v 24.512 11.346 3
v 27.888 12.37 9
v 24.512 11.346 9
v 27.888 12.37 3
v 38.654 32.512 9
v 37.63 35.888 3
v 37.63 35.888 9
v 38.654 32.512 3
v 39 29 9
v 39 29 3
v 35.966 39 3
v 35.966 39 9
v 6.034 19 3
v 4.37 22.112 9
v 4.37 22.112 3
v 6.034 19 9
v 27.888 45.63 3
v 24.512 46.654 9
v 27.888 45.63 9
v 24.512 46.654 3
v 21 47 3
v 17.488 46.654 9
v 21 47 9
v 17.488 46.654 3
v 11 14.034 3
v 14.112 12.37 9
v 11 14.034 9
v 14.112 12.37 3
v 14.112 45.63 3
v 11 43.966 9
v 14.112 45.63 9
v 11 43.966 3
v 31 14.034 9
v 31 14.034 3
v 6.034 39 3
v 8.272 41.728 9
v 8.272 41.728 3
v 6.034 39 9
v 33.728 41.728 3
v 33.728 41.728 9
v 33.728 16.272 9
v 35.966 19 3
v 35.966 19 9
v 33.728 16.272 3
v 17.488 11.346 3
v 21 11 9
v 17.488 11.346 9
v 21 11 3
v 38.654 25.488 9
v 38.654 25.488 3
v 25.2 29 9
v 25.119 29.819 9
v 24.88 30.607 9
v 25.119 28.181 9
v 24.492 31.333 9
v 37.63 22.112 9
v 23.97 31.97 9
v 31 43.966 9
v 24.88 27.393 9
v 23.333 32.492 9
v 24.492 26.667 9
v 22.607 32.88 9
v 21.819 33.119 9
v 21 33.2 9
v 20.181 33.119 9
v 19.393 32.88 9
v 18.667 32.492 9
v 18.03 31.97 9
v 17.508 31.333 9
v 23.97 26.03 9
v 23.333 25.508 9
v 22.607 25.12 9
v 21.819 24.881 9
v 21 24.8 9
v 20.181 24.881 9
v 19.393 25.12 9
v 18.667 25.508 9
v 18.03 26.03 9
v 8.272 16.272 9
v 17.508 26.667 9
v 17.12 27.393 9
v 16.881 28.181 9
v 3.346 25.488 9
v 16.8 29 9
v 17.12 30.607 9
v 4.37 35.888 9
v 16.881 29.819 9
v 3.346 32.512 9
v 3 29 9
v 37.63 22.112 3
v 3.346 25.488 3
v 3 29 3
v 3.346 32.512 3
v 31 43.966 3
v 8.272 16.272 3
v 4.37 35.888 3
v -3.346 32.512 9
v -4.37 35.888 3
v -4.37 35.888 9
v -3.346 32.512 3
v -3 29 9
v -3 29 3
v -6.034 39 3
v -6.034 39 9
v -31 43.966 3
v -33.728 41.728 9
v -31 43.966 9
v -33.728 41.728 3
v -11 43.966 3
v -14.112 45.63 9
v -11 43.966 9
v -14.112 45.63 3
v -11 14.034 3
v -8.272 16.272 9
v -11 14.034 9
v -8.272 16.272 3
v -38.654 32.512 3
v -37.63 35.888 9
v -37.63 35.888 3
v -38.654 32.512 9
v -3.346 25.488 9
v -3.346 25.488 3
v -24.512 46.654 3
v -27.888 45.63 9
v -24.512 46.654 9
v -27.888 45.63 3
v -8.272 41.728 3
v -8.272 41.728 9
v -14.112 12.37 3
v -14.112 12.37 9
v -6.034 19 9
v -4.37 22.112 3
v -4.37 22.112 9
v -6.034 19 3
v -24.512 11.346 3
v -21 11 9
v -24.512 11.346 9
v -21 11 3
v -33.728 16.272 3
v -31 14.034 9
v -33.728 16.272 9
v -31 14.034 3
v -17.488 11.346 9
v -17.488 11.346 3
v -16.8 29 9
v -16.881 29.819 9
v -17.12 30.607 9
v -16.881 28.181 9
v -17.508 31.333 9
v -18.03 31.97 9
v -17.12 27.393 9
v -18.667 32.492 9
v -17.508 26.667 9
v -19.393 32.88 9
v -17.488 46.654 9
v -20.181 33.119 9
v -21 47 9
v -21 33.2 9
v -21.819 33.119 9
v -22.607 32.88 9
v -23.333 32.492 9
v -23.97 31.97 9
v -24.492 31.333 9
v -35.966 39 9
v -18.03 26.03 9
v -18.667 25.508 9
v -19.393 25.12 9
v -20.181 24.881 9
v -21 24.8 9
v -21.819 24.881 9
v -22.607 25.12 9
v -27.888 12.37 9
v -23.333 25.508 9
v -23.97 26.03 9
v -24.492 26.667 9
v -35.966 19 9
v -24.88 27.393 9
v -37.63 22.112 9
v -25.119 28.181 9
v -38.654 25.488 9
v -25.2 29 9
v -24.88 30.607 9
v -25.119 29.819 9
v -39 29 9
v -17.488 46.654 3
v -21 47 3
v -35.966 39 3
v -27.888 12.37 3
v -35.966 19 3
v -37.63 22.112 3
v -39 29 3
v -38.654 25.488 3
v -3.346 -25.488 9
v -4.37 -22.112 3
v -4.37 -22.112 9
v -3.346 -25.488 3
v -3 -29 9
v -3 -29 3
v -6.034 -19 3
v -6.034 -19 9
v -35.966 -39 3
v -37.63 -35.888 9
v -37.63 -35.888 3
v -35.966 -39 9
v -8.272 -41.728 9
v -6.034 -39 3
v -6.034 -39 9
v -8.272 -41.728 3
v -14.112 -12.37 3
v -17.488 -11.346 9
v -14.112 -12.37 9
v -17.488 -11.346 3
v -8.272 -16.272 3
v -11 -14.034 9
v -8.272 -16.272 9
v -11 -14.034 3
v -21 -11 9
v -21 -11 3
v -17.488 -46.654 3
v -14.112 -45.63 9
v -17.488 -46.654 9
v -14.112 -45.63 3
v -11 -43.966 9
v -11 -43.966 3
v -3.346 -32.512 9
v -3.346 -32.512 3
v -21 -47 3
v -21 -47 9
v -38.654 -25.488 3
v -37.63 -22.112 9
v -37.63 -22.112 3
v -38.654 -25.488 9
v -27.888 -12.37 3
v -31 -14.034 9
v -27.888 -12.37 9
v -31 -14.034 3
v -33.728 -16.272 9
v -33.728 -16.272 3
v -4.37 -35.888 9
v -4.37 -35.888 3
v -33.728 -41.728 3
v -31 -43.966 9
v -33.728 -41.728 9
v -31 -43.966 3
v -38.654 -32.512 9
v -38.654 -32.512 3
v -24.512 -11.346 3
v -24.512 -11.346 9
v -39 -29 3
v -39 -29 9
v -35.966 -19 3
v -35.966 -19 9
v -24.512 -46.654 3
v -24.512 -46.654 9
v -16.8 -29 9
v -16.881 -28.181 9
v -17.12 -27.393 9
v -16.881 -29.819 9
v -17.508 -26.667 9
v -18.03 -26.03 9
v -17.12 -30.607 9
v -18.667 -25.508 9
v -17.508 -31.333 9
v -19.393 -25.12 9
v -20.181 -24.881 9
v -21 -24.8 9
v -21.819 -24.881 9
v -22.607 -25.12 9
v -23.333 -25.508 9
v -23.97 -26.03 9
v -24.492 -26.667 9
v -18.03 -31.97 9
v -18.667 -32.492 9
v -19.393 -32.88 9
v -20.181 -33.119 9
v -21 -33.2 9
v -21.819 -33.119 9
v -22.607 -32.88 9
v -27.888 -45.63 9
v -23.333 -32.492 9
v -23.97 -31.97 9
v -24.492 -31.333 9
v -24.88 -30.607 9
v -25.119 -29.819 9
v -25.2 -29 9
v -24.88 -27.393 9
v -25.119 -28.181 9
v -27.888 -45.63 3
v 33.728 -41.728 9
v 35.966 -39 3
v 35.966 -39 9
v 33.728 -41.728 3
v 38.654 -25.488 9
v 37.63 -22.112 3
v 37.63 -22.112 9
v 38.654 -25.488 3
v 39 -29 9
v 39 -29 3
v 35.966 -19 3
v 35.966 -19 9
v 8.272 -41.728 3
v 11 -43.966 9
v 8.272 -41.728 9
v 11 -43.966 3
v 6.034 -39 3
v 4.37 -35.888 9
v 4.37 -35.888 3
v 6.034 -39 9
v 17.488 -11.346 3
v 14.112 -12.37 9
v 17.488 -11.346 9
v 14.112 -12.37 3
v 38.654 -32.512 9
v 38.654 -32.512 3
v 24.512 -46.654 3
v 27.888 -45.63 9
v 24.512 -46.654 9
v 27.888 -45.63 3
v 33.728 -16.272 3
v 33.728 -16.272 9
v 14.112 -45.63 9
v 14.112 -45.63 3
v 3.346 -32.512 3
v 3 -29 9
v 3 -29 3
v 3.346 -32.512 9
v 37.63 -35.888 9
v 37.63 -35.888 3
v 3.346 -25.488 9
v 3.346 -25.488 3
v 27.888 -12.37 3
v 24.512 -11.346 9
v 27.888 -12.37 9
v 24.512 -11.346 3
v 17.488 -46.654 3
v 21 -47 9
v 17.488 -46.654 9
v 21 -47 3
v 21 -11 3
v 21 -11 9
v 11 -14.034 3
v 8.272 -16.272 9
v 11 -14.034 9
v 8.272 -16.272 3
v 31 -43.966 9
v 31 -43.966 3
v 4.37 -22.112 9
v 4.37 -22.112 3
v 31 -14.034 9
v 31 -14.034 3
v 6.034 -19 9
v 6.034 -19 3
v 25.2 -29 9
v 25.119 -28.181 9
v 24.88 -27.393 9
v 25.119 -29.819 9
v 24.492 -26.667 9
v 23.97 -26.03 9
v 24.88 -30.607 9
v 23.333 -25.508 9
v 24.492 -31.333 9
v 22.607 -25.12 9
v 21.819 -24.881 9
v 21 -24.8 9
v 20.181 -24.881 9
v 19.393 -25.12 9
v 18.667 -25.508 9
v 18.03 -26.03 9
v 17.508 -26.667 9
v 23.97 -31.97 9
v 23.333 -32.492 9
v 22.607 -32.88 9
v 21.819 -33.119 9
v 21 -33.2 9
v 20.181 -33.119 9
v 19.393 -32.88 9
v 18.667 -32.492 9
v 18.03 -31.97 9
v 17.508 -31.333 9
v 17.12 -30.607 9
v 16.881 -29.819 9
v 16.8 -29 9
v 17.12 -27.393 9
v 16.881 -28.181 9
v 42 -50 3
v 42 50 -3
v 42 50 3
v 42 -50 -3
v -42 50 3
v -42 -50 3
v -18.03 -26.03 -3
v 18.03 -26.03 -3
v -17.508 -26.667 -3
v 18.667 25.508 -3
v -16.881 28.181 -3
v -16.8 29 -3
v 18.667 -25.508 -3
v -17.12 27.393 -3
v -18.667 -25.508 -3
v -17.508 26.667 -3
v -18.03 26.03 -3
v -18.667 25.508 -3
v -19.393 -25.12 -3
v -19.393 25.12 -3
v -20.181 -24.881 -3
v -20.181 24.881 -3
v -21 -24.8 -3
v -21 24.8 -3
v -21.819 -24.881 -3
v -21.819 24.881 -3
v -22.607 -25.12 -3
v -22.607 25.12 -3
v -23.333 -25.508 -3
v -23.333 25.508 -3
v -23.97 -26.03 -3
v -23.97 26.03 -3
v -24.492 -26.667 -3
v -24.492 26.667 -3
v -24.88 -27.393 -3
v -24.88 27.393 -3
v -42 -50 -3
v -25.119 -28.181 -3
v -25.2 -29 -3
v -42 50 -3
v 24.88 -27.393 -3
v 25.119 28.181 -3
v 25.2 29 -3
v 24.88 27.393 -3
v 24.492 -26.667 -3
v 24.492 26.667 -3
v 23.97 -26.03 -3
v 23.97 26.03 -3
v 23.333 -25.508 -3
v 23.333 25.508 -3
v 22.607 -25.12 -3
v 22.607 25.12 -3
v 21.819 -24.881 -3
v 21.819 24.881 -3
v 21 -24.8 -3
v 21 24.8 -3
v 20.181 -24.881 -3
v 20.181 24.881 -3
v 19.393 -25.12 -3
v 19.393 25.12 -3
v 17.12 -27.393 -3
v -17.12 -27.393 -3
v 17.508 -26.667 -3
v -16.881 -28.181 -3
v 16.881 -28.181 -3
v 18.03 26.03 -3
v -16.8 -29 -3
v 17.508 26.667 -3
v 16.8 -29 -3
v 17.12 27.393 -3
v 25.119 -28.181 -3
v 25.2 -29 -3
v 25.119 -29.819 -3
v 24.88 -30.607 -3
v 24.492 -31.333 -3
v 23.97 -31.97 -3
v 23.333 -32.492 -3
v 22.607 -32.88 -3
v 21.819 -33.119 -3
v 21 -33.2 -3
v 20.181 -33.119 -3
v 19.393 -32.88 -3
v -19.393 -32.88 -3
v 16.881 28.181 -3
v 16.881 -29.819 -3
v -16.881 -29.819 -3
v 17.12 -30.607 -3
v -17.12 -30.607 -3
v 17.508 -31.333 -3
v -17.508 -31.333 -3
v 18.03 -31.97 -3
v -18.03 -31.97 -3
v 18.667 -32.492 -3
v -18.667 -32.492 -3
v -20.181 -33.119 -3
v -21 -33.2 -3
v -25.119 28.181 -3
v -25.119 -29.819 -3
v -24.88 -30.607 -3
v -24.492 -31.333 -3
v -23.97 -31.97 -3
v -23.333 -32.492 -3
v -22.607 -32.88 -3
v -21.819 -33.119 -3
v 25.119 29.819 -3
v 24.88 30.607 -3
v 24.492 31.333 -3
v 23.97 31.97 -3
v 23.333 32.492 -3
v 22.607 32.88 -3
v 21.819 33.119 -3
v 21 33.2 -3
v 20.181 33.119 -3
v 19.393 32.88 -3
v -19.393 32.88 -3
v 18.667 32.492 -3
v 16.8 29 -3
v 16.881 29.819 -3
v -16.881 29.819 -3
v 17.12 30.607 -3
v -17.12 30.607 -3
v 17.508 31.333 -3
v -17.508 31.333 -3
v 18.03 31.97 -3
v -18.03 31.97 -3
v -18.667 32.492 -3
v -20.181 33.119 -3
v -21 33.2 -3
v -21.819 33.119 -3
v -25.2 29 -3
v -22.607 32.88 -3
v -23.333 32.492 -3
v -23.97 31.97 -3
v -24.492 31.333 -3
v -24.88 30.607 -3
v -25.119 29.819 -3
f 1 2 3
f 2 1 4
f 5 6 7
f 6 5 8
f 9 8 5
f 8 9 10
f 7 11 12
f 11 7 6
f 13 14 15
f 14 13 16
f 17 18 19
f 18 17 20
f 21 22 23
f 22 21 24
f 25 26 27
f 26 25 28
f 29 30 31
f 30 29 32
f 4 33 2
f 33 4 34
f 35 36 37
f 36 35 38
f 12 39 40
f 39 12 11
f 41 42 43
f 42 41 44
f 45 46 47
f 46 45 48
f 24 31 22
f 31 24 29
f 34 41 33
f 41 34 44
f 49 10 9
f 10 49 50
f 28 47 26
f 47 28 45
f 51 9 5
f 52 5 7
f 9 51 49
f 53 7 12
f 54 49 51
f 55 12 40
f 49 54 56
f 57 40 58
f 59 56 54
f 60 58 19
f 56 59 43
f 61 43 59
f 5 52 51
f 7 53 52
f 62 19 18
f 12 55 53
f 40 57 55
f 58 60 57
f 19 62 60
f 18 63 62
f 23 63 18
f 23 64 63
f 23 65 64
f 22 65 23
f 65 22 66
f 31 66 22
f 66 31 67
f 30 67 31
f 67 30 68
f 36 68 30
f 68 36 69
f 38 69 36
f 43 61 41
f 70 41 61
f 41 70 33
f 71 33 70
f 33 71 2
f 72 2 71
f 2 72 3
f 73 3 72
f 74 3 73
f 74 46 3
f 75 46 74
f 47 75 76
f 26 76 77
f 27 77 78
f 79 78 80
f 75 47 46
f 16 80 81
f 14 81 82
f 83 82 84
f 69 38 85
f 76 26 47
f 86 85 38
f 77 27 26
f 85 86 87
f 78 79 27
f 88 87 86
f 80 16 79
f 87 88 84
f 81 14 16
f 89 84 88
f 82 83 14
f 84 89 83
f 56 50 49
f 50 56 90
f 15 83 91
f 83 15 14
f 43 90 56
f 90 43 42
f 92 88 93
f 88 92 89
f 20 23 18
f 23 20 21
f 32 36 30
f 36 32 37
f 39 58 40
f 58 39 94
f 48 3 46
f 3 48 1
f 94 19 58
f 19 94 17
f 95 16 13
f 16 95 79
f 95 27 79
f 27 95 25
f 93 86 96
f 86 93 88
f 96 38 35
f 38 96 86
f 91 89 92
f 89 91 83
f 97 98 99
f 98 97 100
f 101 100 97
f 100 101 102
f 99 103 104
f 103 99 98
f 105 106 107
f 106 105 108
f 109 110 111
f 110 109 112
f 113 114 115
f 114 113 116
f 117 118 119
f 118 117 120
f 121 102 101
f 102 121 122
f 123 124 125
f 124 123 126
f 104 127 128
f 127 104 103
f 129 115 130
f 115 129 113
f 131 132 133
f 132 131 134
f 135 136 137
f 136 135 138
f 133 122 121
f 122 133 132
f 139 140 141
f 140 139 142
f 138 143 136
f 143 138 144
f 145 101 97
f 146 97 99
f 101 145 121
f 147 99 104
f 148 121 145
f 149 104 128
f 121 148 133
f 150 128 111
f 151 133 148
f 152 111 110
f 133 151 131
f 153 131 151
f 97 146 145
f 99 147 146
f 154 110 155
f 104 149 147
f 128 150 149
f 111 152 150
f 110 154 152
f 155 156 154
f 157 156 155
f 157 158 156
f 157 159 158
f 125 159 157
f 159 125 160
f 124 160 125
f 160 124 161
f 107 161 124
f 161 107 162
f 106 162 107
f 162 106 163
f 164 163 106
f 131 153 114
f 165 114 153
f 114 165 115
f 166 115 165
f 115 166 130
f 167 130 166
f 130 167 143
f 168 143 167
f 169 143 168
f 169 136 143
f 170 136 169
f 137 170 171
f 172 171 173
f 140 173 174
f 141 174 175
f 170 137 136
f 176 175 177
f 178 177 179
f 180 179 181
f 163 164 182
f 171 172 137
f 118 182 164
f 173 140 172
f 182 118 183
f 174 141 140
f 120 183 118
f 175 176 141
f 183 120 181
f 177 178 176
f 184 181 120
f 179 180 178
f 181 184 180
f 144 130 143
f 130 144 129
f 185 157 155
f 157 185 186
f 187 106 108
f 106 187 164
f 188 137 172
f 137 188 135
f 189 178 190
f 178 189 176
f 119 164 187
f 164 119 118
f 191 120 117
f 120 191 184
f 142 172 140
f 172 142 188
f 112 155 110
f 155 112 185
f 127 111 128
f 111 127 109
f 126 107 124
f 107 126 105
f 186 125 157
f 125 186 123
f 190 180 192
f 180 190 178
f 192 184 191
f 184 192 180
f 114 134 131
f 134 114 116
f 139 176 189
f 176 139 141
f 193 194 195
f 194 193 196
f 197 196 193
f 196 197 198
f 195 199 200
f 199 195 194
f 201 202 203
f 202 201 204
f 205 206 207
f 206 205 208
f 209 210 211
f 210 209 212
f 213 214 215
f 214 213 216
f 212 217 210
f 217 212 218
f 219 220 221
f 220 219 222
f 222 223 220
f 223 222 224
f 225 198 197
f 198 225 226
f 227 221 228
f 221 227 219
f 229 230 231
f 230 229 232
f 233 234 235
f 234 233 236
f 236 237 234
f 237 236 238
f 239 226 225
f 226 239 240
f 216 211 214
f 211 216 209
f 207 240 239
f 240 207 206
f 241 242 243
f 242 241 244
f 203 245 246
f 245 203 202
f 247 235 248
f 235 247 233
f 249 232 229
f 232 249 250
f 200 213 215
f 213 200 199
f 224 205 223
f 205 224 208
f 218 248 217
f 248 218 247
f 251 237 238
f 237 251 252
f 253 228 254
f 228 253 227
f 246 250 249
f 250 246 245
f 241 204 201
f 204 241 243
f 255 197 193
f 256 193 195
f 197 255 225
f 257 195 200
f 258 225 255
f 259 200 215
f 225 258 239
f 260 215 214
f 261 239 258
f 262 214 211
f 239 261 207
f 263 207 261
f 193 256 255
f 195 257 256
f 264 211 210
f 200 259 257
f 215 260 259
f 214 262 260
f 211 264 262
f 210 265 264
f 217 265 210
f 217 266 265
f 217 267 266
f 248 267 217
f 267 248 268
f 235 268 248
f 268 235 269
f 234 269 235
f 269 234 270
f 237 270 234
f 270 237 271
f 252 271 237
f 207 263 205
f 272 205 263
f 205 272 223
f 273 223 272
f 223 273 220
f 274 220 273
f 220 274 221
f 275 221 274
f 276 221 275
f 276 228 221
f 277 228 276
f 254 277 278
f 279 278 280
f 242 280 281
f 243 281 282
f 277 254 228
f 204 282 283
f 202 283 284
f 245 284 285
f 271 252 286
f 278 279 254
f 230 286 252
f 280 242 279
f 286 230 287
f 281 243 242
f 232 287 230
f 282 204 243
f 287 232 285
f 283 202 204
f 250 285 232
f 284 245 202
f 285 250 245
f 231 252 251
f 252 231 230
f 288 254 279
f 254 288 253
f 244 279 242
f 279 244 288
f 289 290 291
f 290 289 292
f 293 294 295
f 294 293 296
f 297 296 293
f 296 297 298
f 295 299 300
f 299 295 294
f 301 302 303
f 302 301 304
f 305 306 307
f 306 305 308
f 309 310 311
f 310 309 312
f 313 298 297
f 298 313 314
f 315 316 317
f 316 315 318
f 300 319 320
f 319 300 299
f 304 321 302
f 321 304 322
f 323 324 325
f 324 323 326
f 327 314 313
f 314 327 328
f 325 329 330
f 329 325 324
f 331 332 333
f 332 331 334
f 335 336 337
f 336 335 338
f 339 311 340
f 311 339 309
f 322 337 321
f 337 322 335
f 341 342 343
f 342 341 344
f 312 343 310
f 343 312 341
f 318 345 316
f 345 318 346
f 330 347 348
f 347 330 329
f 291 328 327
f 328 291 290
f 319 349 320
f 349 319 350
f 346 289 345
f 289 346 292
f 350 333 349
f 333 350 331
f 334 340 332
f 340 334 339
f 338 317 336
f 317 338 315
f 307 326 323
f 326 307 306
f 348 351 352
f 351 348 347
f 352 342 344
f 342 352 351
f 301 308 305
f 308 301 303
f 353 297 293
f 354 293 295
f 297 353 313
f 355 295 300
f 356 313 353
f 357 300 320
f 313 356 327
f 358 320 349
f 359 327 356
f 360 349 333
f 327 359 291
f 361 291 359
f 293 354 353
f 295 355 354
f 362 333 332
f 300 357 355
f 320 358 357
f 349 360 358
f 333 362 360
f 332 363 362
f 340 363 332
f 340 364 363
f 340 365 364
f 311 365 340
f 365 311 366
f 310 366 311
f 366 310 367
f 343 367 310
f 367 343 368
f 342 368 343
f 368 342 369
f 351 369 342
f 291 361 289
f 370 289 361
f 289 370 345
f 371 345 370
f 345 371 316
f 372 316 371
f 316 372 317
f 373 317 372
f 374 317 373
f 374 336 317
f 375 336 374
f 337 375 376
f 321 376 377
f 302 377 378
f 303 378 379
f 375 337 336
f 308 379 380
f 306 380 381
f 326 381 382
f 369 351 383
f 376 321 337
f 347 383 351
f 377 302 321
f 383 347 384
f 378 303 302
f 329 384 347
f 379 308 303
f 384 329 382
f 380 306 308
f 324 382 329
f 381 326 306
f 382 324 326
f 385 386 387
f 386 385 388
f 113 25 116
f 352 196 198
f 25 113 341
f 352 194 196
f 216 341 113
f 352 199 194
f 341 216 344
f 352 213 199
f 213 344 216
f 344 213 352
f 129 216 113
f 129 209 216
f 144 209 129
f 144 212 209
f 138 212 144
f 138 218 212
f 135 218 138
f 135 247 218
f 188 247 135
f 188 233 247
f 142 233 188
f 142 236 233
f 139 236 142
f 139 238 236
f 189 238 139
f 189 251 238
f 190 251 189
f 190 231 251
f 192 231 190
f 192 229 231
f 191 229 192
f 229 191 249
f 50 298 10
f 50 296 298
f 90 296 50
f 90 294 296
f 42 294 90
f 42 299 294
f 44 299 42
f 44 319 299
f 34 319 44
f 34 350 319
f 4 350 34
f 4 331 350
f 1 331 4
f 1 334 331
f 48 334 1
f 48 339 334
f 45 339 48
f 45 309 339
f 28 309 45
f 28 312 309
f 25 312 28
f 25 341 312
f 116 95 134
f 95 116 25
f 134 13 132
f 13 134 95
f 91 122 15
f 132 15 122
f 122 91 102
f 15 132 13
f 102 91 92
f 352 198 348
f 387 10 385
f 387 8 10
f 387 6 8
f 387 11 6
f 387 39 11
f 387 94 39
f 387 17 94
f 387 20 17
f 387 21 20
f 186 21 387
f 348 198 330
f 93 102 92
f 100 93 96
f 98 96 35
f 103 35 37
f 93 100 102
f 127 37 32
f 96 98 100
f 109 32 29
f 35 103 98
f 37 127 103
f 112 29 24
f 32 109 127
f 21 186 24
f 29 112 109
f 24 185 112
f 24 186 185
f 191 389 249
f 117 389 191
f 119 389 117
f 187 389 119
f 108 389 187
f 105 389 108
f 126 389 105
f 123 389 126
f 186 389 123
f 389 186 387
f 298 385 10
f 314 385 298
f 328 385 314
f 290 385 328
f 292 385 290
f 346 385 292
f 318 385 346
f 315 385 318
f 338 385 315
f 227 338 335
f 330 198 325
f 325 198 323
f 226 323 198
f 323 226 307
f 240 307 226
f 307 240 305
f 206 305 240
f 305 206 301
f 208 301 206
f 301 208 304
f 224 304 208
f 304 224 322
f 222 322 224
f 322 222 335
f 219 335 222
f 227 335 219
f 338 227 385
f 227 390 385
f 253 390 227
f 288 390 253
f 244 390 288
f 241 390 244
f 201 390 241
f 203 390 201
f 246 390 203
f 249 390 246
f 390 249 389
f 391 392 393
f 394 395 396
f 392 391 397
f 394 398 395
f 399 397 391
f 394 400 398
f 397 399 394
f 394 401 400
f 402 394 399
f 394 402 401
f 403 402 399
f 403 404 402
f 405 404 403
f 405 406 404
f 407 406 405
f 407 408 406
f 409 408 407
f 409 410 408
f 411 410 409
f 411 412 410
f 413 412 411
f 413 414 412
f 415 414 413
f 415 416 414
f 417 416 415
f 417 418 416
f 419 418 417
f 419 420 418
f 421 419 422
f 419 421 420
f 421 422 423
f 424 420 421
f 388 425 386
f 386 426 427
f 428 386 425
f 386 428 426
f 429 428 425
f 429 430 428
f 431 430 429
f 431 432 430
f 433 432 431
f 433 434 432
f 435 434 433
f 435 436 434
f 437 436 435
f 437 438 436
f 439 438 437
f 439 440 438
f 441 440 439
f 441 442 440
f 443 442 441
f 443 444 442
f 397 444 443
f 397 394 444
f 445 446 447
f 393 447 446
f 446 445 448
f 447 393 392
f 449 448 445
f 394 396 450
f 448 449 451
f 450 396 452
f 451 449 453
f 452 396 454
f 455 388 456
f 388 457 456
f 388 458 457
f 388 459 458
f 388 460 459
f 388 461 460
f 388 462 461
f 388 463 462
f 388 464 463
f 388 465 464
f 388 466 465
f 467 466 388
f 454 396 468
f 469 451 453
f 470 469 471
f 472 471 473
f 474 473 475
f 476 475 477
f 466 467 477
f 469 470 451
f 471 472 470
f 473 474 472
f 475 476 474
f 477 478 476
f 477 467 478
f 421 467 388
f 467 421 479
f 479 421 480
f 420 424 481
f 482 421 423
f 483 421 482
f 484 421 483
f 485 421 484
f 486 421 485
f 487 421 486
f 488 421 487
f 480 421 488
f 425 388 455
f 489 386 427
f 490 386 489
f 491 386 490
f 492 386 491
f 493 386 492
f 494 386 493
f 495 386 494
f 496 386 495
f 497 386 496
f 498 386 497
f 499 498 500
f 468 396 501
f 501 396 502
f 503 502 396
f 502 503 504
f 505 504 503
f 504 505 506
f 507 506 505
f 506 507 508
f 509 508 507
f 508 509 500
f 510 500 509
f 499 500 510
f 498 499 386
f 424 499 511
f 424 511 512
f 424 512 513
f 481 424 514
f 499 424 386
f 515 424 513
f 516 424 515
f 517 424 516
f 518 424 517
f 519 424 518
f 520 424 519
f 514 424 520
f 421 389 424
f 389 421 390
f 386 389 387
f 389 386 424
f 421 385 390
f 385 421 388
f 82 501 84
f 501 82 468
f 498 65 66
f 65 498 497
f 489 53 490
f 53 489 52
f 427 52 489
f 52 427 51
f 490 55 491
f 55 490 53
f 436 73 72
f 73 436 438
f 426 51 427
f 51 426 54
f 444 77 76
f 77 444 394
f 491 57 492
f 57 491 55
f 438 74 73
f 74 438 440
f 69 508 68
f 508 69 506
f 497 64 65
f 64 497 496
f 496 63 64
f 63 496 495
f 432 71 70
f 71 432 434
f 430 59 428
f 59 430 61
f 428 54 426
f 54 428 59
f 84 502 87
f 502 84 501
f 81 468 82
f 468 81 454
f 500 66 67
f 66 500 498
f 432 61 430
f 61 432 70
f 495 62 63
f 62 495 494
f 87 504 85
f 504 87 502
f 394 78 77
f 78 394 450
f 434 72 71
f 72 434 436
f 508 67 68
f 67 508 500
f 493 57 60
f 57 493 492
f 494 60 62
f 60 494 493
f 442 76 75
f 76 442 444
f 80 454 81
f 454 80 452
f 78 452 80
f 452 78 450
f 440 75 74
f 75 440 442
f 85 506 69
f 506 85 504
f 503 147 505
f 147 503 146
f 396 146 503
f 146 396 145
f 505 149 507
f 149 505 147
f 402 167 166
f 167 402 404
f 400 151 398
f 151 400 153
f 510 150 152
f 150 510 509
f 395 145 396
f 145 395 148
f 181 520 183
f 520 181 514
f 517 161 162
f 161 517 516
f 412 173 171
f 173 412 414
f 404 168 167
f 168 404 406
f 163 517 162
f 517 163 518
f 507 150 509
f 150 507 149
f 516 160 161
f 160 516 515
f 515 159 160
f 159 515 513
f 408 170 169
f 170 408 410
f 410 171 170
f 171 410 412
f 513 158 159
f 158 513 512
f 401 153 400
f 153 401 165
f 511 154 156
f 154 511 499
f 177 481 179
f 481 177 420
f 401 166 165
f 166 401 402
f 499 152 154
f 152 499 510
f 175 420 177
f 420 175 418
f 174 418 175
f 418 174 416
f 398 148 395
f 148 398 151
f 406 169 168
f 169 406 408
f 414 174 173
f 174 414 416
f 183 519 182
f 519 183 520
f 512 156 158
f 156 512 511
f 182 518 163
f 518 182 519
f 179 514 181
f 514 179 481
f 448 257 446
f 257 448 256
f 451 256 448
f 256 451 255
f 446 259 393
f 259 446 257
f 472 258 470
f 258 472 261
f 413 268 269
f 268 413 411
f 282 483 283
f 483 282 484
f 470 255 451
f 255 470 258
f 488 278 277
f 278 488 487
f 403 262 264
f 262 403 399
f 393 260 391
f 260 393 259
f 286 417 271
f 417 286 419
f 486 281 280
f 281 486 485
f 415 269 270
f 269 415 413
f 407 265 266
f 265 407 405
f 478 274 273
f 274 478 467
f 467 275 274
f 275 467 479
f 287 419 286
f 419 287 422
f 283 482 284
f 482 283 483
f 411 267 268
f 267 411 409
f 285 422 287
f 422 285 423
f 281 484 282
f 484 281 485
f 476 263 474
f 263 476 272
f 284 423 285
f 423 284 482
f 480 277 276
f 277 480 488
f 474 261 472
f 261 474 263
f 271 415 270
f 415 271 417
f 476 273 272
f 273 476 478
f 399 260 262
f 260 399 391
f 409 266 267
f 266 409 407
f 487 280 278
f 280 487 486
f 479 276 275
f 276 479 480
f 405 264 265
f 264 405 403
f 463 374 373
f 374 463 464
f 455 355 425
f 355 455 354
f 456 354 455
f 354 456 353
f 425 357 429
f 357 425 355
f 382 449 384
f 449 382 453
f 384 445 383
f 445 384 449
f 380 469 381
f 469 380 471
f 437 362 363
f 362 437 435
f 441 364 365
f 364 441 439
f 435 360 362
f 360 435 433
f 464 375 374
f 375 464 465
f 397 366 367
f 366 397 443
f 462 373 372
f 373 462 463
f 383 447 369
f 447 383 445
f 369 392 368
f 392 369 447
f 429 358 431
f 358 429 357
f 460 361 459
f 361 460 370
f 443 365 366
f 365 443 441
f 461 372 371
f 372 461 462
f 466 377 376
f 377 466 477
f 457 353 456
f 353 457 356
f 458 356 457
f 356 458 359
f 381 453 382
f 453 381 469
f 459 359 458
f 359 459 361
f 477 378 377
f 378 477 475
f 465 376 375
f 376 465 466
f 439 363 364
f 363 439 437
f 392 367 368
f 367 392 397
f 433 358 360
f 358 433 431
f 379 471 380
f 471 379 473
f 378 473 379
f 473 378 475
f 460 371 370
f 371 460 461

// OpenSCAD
$fn = 32;

// ----------------------------------------------------------------------
// Anchor pads 84 x 100 x 12
// four corner bosses with anchor holes
// ----------------------------------------------------------------------

// --- parameters (mm) ---
plate = [84, 100, 6];  // base plate size (x, y, z)
pads = 4;              // boss count, one per corner
edge = 21;             // boss centre offset from the plate edge
boss_d = 36;           // boss diameter
boss_h = 6;            // boss height above the base plate
hole_d = 8.4;          // hole diameter

// --- derived feature positions (mm) ---
height = plate[2] + boss_h;      // = 12   overall height of the part
corner_x = plate[0] / 2 - edge;  // = 21   boss centre X
corner_y = plate[1] / 2 - edge;  // = 29   boss centre Y
feature_centers = [
  [corner_x, corner_y],
  [-corner_x, corner_y],
  [-corner_x, -corner_y],
  [corner_x, -corner_y]
];   // boss centres, anchor holes are drilled there

// base plate, four bosses standing on it, anchor holes all the way through
difference() {
  union() {
    cube(plate, center = true);
    for (centre = feature_centers)
      translate([centre[0], centre[1], plate[2] / 2 - 1])
        cylinder(d = boss_d, h = boss_h + 1);
  }
  for (centre = feature_centers)
    translate([centre[0], centre[1], -height])
      cylinder(d = hole_d, h = 2 * height + 2);  // through boss and plate
}
